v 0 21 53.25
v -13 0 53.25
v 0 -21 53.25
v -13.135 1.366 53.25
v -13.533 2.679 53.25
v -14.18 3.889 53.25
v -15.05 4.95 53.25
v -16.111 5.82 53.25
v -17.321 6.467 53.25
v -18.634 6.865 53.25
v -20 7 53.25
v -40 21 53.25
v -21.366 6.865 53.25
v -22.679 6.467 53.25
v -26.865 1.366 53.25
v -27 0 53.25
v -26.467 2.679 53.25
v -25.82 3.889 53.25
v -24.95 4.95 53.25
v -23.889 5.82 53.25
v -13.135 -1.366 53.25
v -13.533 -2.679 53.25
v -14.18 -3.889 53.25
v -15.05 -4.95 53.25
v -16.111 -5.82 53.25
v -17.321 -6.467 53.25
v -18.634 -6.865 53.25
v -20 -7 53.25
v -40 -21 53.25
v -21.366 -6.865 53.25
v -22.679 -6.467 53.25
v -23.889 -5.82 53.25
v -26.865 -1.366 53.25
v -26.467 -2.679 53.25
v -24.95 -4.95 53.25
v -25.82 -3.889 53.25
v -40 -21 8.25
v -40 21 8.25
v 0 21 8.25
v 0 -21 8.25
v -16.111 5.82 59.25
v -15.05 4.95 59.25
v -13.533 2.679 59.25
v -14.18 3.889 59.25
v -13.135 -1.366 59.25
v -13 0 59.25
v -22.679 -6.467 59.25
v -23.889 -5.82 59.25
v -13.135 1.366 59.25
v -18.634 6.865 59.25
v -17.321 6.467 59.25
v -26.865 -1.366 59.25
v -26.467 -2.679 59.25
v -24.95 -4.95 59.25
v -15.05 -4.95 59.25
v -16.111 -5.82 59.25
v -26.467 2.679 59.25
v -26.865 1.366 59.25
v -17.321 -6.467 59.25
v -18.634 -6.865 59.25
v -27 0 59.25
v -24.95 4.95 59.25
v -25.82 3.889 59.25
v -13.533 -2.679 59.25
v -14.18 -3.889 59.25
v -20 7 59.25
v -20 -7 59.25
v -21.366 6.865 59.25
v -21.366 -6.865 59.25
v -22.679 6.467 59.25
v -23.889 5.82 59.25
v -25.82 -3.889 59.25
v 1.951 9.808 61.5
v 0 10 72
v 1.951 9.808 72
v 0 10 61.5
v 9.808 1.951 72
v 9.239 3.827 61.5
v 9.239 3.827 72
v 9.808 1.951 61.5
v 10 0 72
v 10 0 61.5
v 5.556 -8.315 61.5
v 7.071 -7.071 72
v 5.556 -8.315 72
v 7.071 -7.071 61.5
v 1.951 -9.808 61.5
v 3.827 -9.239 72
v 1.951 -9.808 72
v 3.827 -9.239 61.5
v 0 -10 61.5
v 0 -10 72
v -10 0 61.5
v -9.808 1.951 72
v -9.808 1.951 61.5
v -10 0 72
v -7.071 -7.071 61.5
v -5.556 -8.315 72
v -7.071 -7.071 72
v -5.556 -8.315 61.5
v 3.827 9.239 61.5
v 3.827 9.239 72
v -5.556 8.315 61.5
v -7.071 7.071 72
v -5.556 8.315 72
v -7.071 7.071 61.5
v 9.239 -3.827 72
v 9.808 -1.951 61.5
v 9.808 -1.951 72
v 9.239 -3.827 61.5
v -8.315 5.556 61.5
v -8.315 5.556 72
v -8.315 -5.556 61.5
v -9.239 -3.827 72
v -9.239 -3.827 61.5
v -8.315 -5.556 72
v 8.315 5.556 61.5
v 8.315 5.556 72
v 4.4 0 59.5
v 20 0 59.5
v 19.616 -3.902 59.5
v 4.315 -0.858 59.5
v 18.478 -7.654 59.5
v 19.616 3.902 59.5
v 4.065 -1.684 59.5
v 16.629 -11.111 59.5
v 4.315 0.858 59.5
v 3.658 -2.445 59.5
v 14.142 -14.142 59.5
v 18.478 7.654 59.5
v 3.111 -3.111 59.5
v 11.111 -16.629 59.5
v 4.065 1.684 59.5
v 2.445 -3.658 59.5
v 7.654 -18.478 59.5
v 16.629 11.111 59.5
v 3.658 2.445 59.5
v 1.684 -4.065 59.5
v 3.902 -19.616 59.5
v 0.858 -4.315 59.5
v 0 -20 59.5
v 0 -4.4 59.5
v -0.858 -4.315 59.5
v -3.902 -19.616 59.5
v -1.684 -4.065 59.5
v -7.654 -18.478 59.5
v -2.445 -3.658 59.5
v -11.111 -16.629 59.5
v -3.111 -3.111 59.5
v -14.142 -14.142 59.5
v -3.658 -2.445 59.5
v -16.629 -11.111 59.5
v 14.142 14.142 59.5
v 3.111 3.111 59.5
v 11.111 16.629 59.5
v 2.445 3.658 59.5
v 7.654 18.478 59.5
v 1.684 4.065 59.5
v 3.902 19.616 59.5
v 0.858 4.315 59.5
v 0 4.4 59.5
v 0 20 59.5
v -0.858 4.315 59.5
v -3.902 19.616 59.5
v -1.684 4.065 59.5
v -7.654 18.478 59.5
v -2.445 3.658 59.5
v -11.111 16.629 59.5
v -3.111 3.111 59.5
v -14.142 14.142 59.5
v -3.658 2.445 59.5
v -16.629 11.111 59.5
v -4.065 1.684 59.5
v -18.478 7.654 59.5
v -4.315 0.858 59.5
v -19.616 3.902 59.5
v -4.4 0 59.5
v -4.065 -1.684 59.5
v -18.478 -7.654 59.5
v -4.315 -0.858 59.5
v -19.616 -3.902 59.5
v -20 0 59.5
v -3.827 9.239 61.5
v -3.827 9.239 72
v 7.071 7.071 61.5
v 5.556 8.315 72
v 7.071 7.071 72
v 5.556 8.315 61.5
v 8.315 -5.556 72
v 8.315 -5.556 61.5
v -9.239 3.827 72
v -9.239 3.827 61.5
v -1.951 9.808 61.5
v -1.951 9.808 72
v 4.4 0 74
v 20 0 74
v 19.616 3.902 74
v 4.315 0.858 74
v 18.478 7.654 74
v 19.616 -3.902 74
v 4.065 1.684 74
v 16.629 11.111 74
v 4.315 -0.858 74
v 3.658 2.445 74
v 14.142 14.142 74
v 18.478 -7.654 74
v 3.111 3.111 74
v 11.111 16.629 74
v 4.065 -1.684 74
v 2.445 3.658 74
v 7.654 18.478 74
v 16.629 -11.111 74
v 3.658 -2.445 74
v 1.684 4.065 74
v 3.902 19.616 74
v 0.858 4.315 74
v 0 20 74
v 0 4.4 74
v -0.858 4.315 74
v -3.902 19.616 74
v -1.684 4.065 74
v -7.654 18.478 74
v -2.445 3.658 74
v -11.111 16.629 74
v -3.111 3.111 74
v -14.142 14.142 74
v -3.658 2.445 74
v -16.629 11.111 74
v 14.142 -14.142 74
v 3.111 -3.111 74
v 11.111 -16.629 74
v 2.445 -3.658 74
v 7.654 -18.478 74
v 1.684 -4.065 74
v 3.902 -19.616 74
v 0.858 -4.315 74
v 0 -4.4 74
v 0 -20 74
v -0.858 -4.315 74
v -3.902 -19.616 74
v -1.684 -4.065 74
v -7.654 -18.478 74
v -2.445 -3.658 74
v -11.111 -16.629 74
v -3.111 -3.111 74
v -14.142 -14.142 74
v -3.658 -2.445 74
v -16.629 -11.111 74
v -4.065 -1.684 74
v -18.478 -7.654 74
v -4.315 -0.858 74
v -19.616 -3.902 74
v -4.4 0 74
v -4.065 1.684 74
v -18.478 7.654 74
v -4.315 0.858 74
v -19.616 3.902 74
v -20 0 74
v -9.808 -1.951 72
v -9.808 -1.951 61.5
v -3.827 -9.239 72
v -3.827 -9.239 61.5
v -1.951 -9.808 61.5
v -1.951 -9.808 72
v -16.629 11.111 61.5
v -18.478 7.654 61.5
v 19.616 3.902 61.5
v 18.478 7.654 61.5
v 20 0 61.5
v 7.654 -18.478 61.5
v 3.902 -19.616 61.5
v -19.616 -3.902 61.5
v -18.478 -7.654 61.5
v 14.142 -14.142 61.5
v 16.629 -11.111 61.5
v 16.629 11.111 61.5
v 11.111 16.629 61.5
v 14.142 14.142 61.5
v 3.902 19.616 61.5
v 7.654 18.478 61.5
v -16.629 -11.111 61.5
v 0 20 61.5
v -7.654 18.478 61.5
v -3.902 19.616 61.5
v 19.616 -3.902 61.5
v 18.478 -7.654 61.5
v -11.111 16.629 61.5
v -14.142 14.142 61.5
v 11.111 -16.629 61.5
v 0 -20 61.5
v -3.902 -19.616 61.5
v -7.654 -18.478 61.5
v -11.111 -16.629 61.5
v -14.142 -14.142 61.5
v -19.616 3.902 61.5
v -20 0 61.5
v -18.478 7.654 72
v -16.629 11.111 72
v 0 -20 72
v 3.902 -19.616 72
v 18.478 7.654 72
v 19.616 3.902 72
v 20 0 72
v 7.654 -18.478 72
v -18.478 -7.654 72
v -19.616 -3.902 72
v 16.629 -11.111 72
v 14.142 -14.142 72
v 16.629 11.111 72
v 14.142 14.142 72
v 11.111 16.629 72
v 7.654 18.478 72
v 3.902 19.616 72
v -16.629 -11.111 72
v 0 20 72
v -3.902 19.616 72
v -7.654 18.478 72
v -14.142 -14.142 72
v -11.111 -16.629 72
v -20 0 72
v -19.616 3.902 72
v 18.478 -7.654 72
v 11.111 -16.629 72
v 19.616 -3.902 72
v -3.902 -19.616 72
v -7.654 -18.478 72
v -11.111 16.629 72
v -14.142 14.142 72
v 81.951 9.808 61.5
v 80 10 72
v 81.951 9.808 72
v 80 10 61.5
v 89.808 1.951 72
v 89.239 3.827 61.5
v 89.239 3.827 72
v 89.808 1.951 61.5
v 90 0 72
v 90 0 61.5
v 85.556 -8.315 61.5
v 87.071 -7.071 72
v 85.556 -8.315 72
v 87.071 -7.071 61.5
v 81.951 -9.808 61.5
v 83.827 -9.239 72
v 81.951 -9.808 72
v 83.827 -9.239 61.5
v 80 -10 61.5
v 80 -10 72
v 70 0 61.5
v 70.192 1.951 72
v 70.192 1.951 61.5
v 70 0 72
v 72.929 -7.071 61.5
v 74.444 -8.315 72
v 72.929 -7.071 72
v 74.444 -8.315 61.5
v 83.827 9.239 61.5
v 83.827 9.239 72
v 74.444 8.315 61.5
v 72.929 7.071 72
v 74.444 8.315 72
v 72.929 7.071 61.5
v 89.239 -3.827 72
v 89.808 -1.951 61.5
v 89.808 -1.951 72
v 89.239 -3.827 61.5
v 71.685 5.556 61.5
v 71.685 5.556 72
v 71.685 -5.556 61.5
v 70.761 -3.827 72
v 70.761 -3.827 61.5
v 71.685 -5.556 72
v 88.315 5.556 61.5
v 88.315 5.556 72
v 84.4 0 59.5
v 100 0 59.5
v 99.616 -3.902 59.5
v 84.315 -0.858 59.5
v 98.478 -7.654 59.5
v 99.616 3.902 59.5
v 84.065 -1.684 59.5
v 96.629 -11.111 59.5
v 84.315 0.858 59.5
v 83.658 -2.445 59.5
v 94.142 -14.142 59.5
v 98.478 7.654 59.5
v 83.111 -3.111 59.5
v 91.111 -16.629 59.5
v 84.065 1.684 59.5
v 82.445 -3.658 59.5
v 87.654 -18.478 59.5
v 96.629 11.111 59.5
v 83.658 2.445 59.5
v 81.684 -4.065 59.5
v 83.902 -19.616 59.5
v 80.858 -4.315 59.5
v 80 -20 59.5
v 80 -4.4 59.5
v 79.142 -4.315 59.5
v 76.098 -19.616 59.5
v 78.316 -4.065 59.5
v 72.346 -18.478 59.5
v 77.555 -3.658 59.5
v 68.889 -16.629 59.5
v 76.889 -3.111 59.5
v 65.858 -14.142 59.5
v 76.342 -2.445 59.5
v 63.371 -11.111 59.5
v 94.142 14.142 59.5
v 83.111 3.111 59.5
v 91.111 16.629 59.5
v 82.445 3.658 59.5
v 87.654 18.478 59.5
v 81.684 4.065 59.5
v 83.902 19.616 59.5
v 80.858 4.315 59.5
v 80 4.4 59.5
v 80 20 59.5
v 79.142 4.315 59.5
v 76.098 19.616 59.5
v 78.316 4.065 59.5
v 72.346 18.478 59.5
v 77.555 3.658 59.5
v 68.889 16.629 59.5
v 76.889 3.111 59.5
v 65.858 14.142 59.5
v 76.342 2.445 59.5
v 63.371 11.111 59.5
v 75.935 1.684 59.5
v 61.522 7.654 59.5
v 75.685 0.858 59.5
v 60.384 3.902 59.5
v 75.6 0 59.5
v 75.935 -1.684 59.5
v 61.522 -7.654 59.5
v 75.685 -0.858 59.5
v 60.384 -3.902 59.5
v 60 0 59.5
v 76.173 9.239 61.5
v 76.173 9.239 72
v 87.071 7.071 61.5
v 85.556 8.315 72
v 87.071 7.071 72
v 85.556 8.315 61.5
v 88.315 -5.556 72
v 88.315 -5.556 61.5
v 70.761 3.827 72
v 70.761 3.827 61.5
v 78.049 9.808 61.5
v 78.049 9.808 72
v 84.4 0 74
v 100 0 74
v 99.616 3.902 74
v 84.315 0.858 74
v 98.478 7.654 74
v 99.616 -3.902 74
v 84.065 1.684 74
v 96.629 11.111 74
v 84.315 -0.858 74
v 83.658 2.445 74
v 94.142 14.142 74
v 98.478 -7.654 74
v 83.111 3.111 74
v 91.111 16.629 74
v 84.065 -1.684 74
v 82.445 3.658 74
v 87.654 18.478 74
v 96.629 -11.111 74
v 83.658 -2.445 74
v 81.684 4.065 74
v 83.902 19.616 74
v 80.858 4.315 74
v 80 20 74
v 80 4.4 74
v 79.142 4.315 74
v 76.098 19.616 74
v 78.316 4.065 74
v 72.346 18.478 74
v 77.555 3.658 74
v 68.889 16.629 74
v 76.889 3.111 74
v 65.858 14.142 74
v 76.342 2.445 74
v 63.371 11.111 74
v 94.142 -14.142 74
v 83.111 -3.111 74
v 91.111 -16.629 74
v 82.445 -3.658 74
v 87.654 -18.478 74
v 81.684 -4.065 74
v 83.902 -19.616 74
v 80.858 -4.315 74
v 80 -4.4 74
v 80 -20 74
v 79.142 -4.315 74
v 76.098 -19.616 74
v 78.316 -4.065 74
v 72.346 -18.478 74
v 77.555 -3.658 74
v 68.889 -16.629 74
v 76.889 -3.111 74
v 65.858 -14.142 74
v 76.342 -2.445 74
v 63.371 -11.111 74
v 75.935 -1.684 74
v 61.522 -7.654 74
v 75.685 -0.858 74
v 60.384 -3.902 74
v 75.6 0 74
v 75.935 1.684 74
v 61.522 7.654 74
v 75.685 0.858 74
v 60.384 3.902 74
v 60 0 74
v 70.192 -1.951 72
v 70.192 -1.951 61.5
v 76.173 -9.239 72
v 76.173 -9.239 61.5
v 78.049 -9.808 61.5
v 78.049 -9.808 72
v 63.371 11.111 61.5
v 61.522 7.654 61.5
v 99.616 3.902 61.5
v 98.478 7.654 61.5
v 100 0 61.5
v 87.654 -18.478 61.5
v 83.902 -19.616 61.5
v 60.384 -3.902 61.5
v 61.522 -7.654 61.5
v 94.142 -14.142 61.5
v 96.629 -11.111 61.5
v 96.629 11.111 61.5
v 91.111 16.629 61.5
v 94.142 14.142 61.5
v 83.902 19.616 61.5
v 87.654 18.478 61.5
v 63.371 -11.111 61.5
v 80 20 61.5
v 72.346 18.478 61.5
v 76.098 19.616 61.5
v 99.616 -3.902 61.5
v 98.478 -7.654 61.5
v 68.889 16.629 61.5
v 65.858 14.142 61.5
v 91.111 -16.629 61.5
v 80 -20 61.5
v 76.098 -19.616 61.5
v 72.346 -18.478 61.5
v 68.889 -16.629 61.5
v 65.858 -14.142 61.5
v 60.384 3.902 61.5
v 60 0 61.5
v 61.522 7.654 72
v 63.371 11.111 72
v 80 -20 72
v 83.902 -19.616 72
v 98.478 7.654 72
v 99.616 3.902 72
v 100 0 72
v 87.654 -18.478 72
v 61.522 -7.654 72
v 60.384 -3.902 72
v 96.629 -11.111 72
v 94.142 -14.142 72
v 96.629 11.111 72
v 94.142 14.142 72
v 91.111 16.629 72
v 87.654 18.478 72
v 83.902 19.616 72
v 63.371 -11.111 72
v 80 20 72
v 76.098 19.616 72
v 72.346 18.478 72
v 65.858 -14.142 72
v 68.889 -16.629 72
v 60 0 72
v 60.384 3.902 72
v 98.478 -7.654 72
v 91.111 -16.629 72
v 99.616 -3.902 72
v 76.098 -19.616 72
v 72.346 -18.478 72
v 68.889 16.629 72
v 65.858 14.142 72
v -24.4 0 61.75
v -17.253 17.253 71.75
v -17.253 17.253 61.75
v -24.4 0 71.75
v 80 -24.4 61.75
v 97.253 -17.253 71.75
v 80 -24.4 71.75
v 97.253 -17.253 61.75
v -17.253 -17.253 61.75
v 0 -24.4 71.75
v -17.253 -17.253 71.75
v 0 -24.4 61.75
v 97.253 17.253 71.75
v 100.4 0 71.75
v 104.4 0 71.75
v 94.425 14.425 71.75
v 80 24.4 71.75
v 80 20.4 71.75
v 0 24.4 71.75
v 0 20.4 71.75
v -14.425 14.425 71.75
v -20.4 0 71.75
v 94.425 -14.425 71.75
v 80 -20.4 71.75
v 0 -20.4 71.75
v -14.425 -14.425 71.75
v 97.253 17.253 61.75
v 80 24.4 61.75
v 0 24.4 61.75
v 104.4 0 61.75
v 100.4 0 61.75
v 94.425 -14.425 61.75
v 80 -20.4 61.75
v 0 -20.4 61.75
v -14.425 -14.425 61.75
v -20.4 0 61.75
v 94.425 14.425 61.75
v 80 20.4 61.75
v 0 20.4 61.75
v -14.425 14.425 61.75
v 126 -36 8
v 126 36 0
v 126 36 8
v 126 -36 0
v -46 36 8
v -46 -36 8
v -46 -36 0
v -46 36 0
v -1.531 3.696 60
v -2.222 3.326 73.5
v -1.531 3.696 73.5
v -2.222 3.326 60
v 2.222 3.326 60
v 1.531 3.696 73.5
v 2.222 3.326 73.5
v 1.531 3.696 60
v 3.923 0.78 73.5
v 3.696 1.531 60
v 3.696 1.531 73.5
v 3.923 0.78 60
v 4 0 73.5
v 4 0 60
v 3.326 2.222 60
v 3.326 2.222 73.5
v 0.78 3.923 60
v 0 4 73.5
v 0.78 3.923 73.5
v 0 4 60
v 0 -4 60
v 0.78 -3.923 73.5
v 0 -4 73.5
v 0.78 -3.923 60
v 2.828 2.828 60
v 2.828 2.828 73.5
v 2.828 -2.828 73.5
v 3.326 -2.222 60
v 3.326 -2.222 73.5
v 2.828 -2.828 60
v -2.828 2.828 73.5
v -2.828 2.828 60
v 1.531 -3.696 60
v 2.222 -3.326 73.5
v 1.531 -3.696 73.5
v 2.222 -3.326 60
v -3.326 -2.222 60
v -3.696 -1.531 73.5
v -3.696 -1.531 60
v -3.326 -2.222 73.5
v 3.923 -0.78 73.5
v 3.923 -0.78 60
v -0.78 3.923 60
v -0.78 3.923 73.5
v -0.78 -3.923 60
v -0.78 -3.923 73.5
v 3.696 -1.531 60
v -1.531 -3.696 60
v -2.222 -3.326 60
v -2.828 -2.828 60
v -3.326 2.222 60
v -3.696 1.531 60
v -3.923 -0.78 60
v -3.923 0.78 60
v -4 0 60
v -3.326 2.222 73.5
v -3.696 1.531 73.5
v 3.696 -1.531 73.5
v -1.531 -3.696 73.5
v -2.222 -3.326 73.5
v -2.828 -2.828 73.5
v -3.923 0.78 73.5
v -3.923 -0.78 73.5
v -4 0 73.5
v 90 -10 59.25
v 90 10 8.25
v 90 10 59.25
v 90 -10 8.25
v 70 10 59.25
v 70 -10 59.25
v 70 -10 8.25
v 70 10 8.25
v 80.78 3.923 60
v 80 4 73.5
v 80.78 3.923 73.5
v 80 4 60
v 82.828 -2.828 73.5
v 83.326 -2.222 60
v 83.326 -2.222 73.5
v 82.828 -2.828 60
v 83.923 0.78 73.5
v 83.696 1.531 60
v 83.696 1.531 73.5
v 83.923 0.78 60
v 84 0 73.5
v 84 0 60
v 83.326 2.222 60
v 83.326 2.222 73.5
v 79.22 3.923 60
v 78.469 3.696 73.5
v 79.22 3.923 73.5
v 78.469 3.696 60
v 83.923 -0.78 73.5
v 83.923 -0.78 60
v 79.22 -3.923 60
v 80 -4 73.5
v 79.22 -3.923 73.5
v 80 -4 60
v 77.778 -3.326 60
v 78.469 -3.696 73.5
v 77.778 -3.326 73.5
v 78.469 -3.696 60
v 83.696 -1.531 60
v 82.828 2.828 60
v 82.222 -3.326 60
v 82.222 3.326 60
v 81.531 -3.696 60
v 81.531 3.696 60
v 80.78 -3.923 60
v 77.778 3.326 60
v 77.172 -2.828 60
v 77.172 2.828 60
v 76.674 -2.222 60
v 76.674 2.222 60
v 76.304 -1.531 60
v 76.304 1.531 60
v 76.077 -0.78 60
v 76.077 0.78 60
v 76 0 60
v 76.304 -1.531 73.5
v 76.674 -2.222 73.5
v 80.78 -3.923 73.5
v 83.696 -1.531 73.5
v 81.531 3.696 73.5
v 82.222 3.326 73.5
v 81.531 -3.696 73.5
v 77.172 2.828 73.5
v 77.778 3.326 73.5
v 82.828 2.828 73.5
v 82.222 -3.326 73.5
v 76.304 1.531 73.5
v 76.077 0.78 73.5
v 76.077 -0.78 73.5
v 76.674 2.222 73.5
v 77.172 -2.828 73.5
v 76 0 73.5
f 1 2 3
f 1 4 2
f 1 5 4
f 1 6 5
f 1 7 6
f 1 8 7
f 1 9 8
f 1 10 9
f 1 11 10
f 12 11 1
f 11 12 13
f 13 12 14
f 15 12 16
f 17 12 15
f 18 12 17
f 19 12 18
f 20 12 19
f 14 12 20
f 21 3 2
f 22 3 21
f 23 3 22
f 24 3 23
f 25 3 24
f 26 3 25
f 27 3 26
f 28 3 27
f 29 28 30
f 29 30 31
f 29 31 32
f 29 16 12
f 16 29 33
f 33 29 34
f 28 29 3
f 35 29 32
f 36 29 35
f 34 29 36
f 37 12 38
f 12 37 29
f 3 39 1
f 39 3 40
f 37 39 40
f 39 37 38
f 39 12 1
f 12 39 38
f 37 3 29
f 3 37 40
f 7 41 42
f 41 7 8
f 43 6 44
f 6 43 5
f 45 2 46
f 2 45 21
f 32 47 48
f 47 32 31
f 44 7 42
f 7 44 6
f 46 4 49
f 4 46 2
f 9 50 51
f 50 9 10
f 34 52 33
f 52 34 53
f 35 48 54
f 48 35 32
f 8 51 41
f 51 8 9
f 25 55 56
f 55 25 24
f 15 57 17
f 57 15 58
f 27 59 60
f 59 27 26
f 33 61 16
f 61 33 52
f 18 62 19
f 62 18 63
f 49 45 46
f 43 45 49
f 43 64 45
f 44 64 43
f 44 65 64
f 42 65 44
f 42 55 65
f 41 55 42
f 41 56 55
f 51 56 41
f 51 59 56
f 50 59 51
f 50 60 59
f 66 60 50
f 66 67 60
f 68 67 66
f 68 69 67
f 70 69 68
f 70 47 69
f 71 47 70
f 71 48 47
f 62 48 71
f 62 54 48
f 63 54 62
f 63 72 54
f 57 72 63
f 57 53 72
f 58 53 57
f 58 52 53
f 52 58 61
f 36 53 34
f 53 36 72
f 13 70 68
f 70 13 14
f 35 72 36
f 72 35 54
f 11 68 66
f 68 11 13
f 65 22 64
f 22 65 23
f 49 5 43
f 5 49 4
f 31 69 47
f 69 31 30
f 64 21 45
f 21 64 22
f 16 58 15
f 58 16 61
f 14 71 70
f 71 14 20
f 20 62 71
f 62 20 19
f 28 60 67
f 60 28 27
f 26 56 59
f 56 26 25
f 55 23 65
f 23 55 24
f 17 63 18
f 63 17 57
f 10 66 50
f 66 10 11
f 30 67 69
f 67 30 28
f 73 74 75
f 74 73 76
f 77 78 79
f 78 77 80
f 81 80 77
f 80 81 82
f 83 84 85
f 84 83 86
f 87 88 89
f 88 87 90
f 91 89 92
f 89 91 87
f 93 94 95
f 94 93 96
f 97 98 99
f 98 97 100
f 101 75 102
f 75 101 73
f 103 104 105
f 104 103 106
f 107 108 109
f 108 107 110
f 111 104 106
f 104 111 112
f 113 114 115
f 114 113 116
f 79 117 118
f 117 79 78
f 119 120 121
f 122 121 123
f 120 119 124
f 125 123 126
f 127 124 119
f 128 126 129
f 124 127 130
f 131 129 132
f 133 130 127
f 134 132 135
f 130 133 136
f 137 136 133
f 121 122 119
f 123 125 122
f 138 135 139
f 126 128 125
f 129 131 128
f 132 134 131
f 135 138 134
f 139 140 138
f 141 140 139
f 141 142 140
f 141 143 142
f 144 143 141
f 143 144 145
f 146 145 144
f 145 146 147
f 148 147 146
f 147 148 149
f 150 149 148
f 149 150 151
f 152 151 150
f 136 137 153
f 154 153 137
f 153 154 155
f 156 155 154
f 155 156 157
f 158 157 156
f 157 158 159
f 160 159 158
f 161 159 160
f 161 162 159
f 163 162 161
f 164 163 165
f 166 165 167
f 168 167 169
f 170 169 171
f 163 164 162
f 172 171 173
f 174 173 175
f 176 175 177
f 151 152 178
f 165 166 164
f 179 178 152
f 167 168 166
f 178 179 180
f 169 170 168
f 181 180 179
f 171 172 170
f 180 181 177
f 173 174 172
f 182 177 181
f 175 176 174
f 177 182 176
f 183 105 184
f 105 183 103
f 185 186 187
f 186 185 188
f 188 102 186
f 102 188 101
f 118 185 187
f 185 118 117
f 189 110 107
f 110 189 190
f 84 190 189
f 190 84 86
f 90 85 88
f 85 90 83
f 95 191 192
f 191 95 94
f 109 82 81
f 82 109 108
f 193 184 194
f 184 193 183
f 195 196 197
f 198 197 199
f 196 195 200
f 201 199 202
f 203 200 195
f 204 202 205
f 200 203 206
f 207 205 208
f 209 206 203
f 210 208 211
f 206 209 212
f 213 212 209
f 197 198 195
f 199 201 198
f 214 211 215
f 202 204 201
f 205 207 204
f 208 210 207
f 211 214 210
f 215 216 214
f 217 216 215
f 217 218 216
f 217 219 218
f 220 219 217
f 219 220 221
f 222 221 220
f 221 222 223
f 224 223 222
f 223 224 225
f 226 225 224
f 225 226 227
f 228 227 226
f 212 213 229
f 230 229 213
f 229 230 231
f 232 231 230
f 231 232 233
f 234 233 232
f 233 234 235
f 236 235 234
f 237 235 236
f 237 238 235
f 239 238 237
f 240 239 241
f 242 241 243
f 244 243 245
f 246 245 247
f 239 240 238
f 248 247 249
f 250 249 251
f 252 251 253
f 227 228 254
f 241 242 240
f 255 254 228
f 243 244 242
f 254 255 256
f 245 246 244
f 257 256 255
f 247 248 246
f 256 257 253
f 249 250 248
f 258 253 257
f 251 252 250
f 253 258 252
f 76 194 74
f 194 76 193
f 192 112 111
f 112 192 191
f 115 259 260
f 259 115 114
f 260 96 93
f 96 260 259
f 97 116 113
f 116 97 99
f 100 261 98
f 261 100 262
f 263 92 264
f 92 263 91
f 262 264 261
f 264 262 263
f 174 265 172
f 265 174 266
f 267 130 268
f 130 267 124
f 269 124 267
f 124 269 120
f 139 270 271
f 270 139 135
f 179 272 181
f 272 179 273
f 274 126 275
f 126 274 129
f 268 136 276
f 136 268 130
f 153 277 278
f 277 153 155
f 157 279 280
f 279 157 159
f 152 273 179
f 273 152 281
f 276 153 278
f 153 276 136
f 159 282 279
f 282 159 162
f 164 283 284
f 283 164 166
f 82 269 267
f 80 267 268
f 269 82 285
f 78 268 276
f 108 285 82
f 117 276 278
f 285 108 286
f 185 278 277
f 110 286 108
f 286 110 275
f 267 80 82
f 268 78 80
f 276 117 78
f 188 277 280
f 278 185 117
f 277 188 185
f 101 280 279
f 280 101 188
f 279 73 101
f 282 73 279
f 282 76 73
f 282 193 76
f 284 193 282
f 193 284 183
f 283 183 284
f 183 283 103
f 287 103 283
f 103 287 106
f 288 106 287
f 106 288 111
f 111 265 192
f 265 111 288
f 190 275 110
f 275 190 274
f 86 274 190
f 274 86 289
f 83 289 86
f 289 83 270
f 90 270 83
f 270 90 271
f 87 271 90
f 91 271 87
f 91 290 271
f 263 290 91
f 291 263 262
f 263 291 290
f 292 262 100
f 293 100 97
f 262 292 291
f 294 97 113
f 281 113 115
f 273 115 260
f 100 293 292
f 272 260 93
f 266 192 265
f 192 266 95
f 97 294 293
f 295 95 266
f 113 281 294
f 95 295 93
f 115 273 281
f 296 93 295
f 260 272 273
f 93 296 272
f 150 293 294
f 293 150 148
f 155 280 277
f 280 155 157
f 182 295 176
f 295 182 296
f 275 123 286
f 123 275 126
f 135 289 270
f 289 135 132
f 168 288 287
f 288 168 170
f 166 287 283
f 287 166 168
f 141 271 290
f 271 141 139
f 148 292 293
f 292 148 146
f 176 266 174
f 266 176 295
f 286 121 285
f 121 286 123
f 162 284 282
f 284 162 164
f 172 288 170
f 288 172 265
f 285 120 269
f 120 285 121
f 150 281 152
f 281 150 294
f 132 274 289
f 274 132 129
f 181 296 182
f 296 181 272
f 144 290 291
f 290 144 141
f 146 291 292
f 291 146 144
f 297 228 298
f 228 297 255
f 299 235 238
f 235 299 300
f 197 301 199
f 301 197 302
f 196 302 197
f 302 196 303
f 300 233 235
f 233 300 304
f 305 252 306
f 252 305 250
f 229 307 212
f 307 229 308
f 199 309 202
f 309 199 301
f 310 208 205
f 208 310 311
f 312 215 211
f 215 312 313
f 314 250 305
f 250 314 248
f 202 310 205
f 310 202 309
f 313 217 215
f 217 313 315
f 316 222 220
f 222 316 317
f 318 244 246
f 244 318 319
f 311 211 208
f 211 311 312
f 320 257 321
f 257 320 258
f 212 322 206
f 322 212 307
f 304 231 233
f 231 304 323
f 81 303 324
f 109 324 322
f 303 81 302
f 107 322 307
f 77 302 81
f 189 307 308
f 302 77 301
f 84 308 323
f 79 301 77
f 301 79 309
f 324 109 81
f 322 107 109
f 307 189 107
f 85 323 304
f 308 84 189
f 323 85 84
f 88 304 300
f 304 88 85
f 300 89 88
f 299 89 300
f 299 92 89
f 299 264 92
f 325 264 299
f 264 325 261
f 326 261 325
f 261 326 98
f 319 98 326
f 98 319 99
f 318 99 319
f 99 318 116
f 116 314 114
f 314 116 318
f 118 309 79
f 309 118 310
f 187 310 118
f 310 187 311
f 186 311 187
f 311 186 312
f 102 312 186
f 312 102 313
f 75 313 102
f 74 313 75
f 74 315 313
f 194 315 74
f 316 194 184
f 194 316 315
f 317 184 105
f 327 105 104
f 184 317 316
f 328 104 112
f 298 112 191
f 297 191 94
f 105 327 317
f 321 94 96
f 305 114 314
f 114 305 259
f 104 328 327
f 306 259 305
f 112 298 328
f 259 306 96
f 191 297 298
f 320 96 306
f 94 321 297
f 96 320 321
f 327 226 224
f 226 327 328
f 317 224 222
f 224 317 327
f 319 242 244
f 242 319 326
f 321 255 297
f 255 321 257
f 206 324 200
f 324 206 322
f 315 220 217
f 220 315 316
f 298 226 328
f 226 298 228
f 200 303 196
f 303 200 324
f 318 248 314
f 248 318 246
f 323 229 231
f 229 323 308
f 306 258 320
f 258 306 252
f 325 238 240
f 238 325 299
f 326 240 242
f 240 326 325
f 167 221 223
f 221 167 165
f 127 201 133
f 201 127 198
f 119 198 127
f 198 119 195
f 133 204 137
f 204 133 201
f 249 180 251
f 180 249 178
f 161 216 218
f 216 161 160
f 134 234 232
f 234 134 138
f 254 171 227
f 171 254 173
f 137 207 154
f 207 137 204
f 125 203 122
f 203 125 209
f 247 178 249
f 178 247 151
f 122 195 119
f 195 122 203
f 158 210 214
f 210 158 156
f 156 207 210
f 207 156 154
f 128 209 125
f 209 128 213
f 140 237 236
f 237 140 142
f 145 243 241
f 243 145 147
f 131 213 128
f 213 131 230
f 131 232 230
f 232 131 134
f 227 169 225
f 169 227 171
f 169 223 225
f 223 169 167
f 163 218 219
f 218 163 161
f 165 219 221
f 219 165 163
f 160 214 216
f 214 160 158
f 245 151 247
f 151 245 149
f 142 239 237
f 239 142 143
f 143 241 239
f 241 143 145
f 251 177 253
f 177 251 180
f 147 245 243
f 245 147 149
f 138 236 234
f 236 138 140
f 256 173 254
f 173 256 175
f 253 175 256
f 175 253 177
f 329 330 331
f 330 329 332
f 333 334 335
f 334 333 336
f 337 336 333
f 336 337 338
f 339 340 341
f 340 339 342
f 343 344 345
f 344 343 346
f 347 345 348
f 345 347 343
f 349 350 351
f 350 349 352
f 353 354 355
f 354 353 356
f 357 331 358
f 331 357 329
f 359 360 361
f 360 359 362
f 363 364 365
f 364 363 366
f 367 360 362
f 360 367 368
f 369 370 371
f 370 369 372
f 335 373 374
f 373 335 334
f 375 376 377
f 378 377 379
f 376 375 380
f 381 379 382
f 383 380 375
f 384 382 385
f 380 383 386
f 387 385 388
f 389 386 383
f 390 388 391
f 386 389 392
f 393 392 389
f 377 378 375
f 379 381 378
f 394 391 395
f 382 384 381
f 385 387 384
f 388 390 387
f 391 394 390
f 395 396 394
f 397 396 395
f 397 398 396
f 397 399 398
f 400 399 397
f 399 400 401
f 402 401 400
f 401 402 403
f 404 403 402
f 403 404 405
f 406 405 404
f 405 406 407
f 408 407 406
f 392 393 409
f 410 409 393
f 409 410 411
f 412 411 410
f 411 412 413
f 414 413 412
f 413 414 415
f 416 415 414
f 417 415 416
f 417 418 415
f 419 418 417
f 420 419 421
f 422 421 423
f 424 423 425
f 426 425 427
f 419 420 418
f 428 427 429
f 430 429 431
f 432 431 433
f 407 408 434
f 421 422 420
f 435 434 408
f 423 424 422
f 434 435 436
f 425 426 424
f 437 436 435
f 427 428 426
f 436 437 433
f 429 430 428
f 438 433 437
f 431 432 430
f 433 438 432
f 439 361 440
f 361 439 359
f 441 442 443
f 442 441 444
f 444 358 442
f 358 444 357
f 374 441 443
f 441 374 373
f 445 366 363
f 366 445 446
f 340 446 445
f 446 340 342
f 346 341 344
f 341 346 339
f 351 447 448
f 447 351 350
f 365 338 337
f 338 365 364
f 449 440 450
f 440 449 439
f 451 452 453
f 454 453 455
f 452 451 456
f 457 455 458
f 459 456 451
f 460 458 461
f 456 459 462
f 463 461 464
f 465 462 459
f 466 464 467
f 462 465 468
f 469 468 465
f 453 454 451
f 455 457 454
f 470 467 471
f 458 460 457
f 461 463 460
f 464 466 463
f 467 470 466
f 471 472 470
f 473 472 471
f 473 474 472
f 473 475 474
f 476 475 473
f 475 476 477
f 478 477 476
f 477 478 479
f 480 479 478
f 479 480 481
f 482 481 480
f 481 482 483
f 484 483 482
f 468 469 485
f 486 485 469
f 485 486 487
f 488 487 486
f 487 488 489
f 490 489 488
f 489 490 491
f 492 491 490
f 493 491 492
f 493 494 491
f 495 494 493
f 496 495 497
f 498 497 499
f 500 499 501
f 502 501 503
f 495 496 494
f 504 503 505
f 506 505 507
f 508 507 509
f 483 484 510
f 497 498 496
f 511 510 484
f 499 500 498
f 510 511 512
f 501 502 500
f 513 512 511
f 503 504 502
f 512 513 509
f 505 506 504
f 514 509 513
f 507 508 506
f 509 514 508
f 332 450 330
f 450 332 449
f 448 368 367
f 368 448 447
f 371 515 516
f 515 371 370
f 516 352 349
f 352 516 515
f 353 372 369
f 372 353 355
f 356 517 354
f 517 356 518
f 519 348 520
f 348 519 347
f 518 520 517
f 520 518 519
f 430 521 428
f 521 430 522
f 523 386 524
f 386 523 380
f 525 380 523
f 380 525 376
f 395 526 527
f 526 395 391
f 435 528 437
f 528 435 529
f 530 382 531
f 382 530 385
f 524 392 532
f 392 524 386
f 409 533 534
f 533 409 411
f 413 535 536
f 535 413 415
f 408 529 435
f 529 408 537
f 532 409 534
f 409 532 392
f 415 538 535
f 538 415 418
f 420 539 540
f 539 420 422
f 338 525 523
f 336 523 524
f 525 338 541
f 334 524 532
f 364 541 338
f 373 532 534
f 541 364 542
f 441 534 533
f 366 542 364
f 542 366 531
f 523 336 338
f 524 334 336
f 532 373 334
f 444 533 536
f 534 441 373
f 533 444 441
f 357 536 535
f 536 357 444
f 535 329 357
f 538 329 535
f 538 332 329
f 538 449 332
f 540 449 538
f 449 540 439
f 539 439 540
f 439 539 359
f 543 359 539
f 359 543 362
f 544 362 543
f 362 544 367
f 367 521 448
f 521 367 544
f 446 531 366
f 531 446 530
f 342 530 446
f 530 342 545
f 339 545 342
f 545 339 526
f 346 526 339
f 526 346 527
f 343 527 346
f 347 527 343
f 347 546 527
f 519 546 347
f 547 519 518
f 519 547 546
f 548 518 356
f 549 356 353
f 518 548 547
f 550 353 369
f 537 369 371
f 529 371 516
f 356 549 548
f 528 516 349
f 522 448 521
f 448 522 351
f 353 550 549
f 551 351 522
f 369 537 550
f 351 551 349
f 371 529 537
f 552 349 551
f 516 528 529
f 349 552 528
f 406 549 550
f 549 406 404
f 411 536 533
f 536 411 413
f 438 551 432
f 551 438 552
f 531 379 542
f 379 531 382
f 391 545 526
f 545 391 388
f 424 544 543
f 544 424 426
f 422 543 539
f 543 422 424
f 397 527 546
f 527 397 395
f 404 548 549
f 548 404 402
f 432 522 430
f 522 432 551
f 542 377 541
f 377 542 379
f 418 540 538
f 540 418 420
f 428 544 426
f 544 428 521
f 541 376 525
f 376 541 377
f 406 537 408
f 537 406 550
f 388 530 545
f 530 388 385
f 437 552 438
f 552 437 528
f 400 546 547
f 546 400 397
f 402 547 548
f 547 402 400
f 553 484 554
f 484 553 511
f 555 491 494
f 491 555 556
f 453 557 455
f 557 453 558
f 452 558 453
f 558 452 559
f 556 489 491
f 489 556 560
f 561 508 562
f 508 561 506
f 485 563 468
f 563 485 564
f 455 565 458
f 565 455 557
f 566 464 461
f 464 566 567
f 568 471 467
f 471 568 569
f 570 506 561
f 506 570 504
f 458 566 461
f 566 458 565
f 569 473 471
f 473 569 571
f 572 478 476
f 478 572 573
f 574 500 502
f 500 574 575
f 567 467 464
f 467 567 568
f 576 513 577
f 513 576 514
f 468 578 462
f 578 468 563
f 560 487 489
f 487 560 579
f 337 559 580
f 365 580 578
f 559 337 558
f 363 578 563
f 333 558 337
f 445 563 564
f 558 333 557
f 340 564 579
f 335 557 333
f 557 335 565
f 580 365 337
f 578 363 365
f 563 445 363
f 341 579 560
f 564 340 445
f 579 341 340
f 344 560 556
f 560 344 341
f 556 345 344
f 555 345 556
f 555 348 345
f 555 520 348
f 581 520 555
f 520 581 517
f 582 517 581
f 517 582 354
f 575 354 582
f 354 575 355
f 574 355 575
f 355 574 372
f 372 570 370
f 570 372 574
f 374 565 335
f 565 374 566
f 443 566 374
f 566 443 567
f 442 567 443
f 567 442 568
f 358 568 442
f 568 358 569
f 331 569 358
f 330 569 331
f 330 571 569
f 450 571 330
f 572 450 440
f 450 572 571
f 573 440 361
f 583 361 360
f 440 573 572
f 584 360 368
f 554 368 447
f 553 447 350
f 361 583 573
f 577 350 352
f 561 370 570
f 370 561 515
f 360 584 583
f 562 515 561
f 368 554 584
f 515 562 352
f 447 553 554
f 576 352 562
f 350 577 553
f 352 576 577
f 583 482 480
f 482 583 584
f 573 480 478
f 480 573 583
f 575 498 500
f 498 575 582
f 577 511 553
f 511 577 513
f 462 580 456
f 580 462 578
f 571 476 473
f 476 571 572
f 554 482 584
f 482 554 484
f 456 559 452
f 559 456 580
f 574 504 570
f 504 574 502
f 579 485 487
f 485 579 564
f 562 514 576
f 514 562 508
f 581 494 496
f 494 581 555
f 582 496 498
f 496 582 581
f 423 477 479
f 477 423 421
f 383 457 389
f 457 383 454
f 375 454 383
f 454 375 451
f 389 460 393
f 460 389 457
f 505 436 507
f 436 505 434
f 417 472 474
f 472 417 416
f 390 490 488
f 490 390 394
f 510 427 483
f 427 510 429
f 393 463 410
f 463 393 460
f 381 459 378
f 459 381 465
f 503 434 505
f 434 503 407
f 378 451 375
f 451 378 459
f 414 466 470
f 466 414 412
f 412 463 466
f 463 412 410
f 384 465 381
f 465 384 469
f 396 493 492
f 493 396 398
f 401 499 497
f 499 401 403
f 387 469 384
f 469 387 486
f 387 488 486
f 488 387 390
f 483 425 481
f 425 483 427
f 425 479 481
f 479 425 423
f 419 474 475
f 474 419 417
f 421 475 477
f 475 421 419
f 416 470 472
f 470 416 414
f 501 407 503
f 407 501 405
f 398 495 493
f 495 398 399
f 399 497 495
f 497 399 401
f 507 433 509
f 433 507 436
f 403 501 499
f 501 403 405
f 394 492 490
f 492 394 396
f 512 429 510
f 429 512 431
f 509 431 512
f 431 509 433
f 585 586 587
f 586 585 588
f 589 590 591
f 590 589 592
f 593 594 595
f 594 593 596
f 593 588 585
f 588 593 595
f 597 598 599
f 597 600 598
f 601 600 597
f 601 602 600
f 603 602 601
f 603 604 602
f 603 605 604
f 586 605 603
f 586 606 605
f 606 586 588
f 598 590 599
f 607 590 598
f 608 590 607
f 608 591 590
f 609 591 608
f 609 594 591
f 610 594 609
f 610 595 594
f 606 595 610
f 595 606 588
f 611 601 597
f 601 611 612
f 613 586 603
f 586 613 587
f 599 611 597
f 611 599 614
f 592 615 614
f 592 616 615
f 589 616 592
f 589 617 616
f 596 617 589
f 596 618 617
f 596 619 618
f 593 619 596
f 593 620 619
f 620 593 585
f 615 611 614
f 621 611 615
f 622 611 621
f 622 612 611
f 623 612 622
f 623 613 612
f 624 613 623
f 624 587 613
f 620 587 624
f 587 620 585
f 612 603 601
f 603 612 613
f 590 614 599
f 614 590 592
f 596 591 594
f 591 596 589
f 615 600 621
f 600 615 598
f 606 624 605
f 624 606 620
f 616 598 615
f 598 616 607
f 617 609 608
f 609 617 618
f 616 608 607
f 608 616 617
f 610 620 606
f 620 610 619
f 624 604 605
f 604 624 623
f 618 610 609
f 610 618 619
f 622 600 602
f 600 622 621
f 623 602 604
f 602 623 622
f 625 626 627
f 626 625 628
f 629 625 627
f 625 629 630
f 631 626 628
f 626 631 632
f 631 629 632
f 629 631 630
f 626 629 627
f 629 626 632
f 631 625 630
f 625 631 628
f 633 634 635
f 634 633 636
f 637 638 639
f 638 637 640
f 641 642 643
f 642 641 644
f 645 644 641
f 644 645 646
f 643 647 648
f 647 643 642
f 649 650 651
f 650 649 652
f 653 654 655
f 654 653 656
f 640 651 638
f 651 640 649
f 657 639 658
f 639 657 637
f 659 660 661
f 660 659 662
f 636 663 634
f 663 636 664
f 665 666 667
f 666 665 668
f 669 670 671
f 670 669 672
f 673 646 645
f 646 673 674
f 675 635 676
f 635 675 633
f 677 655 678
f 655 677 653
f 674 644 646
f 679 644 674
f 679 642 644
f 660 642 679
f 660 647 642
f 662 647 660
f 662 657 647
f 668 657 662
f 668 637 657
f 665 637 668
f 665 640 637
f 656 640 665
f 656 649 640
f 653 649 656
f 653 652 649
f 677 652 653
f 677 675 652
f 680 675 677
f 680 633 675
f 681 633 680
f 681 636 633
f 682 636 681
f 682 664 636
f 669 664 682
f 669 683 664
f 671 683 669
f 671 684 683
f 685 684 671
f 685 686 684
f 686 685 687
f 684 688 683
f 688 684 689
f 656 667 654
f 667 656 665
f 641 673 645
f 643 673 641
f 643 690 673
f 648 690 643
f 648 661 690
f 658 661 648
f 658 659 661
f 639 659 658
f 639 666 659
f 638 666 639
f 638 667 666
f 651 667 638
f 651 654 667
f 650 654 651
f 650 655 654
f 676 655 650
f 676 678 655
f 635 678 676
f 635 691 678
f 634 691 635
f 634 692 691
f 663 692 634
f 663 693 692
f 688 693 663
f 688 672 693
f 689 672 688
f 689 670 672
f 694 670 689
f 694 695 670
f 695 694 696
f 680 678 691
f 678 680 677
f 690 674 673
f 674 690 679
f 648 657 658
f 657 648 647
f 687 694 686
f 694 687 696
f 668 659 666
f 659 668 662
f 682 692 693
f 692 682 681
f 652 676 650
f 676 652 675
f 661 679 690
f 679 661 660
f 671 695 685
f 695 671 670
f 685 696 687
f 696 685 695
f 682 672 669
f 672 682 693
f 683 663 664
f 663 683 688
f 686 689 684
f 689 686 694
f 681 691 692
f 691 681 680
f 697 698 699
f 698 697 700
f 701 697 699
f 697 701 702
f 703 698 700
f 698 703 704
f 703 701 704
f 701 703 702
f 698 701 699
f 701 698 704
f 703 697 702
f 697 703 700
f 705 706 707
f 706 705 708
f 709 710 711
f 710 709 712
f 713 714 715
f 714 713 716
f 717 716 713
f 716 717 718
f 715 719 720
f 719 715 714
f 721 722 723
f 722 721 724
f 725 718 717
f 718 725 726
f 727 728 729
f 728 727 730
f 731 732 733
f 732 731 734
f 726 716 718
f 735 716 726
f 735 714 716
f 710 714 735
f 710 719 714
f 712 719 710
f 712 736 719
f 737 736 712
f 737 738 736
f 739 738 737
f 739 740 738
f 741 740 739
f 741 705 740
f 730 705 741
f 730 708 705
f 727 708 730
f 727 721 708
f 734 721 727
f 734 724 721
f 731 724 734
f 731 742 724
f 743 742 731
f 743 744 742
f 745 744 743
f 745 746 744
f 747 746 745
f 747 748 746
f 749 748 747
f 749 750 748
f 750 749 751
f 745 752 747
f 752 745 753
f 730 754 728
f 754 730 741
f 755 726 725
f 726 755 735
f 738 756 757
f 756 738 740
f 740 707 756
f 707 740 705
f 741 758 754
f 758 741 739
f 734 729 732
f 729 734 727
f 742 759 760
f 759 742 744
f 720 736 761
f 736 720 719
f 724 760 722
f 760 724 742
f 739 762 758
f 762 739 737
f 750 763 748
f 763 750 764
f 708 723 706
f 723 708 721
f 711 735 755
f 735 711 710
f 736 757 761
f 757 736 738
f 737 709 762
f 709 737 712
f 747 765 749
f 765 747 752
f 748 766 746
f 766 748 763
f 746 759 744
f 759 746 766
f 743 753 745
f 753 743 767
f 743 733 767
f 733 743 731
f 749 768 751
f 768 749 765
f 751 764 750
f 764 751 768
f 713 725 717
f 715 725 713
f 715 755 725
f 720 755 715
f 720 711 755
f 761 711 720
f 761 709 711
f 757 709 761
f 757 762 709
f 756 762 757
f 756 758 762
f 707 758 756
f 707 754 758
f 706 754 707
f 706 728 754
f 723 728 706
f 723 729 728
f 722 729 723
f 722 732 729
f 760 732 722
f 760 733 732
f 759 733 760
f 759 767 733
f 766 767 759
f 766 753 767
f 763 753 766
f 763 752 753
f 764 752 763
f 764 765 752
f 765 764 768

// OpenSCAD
$fn = 32;

// ------------------------------------------------------------------------
// Motor belt drive: span 80 mm, pulleys d40, belt 10 mm wide
// Every part is its own module, assembly() places every instance.
// ------------------------------------------------------------------------

// --- part 1 ---
module base_plate() {
  difference() {
    translate([-86, -36, 0]) cube([172, 72, 8]);
  }
}

// --- part 2 ---
module motor() {
  union() {
    translate([-22.5, -21, 0]) cube([45, 42, 40]);
    translate([25.5, 0, 20]) rotate([0, 90, 0]) cylinder(h = 6, d = 14, center = true);
  }
}

// --- part 3 ---
module drive_shaft() {
  translate([0, 0, -6.75]) cylinder(h = 13.5, d = 8);
}

// --- part 4 ---
module pulley_drive() {
  difference() {
    union() {
      cylinder(h = 14.5, d = 20);
      cylinder(h = 2, d = 40);
      translate([0, 0, 12.5]) cylinder(h = 2, d = 40);
    }
    translate([0, 0, -1]) cylinder(h = 16.5, d = 8.8);
  }
}

// --- part 5 ---
module idler_post() {
  translate([-10, -10, 0]) cube([20, 20, 51]);
}

// --- part 6 ---
module driven_shaft() {
  translate([0, 0, -6.75]) cylinder(h = 13.5, d = 8);
}

// --- part 7 ---
module pulley_driven() {
  difference() {
    union() {
      cylinder(h = 14.5, d = 20);
      cylinder(h = 2, d = 40);
      translate([0, 0, 12.5]) cylinder(h = 2, d = 40);
    }
    translate([0, 0, -1]) cylinder(h = 16.5, d = 8.8);
  }
}

// --- part 8 ---
module drive_belt() {
  difference() {
    linear_extrude(height = 10) polygon(points = concat([for (a = [90 : 45 : 270]) [24.4 * cos(a), 24.4 * sin(a)]], [for (a = [270 : 45 : 450]) [80 + 24.4 * cos(a), 24.4 * sin(a)]]));
    translate([0, 0, -1]) linear_extrude(height = 12) polygon(points = concat([for (a = [90 : 45 : 270]) [20.4 * cos(a), 20.4 * sin(a)]], [for (a = [270 : 45 : 450]) [80 + 20.4 * cos(a), 20.4 * sin(a)]]));
  }
}

// --- assembly ---
module assembly() {
  color([0.80, 0.24, 0.20]) translate([40, 0, 0]) rotate([0, 0, 0]) base_plate();
  color([0.20, 0.45, 0.75]) translate([0, 0, 30.75]) rotate([0, 270, 0]) motor();
  color([0.25, 0.62, 0.32]) translate([0, 0, 66.75]) rotate([0, 0, 0]) drive_shaft();
  color([0.92, 0.70, 0.18]) translate([0, 0, 59.5]) rotate([0, 0, 0]) pulley_drive();
  color([0.58, 0.35, 0.70]) translate([80, 0, 8.25]) rotate([0, 0, 0]) idler_post();
  color([0.16, 0.66, 0.66]) translate([80, 0, 66.75]) rotate([0, 0, 0]) driven_shaft();
  color([0.85, 0.48, 0.18]) translate([80, 0, 59.5]) rotate([0, 0, 0]) pulley_driven();
  color([0.55, 0.60, 0.65]) translate([0, 0, 61.75]) rotate([0, 0, 0]) drive_belt();
}

assembly();
